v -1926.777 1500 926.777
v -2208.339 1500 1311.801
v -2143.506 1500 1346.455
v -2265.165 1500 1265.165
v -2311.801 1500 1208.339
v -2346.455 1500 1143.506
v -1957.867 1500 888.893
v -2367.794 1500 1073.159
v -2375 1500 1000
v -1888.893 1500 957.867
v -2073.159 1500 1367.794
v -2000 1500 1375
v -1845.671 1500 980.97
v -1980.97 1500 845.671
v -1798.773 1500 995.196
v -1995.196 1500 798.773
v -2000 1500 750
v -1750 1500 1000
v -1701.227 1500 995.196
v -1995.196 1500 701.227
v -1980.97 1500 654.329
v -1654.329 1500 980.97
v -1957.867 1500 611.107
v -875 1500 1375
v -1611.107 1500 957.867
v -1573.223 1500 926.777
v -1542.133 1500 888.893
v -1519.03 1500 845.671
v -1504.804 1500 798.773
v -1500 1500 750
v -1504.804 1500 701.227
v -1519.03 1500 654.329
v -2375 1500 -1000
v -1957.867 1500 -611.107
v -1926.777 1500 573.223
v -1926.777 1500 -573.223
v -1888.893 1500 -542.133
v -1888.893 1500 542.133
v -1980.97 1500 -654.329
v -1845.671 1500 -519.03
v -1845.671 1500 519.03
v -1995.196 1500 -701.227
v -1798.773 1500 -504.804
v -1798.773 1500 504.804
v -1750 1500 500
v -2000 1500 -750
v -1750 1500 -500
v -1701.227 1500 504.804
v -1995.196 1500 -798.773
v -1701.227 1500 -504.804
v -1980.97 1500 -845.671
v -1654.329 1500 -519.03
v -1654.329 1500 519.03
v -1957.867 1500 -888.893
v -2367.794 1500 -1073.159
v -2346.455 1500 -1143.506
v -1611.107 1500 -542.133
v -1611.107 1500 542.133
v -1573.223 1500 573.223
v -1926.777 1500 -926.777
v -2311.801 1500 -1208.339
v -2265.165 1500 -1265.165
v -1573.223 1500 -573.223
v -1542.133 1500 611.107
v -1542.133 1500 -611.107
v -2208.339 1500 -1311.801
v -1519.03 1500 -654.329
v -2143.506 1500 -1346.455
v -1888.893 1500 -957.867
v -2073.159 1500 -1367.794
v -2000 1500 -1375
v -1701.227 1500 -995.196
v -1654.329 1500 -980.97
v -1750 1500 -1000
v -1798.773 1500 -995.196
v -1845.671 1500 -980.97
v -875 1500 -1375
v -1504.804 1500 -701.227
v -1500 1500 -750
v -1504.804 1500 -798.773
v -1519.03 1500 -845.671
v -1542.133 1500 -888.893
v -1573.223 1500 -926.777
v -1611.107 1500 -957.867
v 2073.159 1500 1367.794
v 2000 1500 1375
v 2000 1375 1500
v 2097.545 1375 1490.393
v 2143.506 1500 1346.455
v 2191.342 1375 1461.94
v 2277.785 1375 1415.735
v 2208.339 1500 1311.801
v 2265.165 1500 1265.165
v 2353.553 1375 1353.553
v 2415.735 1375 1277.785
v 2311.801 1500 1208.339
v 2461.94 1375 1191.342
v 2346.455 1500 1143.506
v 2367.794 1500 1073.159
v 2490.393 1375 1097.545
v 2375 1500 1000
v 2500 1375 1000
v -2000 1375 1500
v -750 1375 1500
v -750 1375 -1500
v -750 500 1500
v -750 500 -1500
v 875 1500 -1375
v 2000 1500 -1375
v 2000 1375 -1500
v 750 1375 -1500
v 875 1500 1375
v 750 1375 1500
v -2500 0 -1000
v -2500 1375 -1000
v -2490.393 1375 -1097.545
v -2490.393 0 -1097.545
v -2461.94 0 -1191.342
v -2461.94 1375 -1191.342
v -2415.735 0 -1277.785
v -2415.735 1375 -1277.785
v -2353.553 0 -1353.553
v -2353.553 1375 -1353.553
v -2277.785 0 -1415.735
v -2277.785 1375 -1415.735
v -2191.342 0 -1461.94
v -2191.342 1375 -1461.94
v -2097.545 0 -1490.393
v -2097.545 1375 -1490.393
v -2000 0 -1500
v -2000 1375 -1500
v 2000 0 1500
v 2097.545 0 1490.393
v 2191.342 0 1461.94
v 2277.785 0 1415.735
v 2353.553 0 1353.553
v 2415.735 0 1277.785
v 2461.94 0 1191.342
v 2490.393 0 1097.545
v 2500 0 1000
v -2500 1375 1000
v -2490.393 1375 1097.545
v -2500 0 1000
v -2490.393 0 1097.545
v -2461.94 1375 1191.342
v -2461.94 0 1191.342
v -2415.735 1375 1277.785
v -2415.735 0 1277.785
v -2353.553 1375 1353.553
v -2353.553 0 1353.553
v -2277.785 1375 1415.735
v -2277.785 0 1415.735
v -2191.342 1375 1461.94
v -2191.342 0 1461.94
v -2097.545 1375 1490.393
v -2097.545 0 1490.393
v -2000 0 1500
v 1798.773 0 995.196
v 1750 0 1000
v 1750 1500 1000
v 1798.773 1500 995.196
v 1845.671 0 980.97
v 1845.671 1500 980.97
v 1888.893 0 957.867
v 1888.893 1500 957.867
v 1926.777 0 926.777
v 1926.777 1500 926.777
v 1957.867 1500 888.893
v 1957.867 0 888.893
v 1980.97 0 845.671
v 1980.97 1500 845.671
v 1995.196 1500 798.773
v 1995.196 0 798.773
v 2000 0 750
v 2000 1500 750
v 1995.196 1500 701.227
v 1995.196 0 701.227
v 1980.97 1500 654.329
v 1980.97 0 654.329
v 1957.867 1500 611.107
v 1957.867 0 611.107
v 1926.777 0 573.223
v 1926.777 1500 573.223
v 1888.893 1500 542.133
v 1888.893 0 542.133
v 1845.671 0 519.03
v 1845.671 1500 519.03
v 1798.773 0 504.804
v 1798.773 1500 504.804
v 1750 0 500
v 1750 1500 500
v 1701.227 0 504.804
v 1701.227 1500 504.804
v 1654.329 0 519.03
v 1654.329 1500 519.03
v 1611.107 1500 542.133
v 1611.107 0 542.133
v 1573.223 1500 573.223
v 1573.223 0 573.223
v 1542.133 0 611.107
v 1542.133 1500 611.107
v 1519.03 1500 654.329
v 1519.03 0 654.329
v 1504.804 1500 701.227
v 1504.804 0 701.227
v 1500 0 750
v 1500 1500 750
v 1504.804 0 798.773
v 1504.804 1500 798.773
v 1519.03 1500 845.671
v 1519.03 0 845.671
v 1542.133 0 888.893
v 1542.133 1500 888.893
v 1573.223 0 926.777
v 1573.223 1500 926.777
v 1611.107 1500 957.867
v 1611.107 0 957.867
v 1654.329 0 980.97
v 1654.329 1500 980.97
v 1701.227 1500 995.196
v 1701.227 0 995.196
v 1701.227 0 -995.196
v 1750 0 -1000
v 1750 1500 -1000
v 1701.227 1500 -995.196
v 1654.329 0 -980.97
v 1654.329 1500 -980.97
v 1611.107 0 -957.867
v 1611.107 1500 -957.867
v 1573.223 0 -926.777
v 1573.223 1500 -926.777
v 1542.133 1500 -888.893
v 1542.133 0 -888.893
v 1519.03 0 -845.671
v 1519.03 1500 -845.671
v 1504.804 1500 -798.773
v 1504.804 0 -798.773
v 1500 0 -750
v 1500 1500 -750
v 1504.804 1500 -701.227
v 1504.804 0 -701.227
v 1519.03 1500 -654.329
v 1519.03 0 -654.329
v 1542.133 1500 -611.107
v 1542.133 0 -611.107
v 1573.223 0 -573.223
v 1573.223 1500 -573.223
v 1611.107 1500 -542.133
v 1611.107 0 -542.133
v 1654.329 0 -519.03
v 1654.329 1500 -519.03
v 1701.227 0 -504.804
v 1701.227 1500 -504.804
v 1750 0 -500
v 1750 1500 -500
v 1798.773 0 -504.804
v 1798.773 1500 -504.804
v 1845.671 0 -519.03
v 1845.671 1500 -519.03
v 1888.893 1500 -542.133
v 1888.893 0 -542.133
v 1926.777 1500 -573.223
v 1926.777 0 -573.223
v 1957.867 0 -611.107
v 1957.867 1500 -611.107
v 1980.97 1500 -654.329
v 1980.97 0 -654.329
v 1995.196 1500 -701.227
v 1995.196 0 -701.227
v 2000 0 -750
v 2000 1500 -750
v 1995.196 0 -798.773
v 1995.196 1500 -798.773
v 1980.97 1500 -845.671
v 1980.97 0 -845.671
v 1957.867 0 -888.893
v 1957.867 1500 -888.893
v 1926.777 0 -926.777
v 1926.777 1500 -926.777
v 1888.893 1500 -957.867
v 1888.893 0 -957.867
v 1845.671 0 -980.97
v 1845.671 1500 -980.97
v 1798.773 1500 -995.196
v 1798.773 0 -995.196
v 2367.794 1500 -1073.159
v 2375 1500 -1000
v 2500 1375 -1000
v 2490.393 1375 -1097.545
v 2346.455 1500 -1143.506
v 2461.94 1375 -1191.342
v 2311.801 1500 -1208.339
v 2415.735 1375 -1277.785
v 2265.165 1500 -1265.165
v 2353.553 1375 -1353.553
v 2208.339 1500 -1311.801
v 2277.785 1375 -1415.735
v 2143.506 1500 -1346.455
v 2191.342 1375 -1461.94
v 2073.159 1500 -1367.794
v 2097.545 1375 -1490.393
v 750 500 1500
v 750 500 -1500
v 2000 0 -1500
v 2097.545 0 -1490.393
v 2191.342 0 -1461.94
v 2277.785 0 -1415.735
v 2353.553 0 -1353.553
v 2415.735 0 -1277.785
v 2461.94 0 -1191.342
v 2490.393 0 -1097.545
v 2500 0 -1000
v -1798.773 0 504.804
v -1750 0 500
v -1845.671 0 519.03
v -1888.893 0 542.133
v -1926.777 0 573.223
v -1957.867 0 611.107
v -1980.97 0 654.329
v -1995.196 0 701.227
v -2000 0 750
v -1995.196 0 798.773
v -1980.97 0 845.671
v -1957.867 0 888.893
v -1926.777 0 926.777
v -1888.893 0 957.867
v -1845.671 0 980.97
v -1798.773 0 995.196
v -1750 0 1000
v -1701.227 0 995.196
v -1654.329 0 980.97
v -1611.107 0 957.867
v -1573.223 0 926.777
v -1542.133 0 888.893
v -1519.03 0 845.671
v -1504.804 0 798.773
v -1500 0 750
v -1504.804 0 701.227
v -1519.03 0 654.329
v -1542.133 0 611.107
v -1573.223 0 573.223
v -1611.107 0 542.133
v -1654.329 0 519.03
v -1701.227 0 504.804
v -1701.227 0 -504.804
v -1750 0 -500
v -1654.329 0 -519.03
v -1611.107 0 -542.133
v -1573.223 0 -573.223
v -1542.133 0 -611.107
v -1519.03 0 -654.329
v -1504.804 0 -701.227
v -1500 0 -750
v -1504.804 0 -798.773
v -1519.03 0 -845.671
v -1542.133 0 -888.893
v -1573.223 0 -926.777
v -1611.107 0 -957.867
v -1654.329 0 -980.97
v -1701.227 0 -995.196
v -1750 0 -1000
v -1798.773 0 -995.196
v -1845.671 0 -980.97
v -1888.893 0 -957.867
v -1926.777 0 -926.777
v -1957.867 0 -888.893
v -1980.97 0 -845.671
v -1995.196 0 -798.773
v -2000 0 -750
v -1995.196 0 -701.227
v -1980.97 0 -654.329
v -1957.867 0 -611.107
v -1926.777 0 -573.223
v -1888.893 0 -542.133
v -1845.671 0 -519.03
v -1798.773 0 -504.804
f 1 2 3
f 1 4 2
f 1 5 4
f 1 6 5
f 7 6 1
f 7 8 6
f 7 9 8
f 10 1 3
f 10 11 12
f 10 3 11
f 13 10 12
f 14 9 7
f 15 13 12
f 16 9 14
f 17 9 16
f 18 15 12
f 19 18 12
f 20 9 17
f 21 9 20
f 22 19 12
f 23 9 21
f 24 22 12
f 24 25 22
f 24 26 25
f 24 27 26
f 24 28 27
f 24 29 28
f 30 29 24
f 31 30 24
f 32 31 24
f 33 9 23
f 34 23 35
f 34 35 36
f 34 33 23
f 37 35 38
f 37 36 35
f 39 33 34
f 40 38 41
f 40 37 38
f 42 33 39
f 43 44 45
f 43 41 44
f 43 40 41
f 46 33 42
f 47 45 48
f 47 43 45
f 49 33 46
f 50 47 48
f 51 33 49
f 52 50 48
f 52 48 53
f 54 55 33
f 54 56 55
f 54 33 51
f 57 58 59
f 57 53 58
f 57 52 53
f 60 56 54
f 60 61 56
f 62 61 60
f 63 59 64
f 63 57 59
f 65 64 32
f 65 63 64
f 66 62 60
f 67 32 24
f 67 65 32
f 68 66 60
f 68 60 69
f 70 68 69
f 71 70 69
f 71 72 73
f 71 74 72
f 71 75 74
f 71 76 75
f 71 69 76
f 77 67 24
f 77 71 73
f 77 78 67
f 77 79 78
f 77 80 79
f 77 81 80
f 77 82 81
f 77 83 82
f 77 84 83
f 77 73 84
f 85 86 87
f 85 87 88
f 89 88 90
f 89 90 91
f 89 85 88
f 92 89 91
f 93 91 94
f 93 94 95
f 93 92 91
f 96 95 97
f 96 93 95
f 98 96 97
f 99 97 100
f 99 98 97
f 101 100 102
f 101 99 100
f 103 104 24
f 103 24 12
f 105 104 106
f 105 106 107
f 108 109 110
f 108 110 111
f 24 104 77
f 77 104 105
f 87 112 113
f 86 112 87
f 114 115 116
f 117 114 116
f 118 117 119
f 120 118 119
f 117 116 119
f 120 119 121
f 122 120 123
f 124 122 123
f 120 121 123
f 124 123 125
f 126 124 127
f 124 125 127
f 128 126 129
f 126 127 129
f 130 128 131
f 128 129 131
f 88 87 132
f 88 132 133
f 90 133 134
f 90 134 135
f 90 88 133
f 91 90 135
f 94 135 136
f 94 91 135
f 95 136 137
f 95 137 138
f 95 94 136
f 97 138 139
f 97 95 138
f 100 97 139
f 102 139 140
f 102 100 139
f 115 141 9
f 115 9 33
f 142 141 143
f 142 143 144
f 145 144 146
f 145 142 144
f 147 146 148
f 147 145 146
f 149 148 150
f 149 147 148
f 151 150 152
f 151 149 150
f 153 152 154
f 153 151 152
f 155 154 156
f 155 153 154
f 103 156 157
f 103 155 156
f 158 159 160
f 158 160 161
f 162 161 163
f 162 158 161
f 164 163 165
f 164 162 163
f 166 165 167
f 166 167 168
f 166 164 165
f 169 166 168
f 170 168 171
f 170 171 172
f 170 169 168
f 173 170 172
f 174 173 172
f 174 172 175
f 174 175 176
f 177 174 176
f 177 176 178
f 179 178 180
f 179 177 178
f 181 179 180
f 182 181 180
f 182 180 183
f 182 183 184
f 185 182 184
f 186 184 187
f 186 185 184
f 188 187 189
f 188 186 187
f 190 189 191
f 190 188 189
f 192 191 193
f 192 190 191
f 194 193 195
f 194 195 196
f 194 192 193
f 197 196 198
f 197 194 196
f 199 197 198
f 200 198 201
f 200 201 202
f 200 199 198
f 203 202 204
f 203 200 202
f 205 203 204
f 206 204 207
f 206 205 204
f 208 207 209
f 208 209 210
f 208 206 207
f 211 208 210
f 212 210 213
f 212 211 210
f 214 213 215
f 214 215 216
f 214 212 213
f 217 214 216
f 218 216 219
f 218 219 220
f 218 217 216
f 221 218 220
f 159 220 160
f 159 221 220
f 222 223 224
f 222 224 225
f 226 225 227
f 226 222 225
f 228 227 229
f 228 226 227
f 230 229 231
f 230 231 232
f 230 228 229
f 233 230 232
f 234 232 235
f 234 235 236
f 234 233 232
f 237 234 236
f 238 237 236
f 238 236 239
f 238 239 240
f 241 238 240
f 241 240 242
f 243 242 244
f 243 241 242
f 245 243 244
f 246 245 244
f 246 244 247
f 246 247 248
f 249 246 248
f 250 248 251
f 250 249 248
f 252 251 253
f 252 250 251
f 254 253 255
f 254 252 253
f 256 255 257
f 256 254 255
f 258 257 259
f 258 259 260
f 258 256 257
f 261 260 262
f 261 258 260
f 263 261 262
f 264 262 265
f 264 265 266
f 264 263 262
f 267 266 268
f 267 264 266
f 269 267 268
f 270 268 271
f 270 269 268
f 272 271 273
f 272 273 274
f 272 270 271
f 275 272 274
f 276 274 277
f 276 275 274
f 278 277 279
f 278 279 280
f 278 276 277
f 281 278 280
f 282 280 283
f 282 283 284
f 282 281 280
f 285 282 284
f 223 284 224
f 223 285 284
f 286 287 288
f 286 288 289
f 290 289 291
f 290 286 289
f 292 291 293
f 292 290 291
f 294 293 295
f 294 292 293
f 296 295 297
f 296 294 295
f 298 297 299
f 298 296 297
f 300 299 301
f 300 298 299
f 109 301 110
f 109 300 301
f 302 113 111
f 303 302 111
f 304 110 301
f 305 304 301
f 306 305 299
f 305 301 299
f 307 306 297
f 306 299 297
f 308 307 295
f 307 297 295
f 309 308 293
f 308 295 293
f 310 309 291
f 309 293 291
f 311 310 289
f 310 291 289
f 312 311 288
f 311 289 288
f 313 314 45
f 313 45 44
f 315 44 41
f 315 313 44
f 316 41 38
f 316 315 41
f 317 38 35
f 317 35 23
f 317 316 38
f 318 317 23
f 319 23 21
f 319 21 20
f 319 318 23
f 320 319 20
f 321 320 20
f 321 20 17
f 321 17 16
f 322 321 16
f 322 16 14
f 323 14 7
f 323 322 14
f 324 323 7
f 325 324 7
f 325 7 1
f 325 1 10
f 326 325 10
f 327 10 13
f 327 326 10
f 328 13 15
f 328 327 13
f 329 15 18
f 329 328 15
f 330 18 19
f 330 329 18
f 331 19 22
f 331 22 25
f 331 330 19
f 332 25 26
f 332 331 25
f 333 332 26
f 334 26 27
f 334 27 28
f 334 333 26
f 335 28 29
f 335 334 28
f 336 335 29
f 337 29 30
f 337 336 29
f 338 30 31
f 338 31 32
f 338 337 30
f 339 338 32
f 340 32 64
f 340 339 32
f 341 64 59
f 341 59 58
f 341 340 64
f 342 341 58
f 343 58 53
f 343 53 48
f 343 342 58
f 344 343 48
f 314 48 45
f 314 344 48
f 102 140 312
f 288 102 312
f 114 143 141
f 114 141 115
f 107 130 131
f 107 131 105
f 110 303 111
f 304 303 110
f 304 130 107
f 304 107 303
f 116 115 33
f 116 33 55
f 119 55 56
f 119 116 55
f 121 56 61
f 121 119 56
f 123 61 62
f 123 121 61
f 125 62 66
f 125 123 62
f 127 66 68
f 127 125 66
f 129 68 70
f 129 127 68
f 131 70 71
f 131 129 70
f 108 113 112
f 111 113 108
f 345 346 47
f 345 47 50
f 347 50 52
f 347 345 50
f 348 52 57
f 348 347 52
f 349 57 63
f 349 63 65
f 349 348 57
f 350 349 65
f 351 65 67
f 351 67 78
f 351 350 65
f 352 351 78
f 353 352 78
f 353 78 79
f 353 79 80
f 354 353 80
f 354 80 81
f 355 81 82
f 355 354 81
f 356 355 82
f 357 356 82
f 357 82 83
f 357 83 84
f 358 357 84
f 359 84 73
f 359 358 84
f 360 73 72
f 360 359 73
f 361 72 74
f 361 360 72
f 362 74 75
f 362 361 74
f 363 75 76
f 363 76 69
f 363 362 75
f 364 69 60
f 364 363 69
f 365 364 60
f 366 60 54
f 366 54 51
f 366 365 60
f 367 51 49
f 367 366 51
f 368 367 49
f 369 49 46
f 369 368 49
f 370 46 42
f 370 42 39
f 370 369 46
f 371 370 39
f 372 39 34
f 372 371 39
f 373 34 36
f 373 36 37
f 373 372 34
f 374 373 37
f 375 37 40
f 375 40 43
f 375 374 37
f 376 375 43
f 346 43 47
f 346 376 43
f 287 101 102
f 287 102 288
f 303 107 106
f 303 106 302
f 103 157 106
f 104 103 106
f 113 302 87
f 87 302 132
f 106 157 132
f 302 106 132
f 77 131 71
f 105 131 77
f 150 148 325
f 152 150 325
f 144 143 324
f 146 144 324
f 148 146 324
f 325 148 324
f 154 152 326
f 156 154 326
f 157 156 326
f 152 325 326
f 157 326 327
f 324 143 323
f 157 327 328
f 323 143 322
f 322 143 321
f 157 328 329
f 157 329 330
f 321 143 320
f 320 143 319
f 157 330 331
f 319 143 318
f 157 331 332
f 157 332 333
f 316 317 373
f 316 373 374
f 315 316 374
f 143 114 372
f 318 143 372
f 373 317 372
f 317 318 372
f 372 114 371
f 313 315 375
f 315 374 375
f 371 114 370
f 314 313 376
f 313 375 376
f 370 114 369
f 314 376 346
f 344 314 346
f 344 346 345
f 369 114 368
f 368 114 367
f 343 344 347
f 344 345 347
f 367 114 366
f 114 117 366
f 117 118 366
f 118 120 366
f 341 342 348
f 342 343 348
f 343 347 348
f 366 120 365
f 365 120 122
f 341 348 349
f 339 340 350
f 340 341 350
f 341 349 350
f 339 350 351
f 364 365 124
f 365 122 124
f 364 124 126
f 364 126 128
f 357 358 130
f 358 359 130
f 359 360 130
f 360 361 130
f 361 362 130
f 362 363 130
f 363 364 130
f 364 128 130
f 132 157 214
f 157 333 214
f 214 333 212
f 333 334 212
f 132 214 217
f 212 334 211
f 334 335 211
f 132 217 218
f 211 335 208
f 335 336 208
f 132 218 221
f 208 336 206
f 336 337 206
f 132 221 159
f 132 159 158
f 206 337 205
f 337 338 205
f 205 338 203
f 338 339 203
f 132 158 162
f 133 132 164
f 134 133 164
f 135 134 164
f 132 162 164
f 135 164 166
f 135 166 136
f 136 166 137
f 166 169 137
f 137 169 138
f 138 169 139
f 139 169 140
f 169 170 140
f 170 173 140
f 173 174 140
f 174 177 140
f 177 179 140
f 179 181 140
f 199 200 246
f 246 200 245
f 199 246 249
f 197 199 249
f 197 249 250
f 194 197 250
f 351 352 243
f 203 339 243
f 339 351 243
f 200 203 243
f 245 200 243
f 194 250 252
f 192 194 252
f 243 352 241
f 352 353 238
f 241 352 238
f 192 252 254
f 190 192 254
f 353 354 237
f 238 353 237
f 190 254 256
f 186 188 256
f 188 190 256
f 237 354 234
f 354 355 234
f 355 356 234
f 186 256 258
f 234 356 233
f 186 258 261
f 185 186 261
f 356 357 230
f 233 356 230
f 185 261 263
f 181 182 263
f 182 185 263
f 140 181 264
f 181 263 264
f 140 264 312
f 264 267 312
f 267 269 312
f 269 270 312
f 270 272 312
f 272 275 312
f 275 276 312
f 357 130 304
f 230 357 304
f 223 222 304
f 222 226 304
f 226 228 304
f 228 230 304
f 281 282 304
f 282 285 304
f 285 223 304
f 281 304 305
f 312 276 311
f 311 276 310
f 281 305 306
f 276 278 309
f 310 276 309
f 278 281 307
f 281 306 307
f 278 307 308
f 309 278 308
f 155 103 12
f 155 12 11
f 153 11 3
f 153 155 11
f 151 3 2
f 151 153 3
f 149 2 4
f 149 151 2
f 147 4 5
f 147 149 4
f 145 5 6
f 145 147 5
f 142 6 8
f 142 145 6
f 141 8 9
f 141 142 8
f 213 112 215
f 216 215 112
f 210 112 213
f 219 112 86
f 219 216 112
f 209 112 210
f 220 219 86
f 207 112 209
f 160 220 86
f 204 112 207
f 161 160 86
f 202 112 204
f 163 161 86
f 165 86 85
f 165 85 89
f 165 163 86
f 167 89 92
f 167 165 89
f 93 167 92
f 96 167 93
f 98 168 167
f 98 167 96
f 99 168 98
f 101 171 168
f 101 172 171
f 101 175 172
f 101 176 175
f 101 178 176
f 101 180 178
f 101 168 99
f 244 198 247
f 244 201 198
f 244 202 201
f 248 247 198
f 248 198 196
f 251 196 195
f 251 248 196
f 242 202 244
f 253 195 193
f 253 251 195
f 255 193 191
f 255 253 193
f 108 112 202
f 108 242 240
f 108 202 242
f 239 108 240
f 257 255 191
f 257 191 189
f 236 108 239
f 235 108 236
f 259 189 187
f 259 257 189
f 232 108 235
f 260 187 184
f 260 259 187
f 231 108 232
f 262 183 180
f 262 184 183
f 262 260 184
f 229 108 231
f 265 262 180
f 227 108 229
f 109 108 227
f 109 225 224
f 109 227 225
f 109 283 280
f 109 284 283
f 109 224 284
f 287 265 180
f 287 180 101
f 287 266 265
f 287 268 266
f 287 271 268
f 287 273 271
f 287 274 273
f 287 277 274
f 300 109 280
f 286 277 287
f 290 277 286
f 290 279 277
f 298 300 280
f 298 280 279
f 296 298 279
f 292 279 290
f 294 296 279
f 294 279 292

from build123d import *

# Parameters (mm, degrees)
SKETCH1_W           = 5000
SKETCH1_H           = 3000
SKETCH1_R           = 250
BOSS_EXTRUDE1_DEPTH = 1500
SKETCH2_W           = 1500
SKETCH2_H           = 3000
CUT_EXTRUDE1_DEPTH  = 1000
FILLET1_R           = 500
CHAMFER1_SIZE       = 125


with BuildPart() as part:
    # Sketch1 → Boss-Extrude1 (new body)
    with BuildSketch(Plane(origin=(0, 0, 0), x_dir=(1, 0, 0), z_dir=(0, 1, 0))):
        Rectangle(SKETCH1_W, SKETCH1_H)
        with Locations(Location((-1750, 750, 0), (0, 0, 270))):
            Circle(SKETCH1_R, mode=Mode.SUBTRACT)
        with Locations(Location((1750, 750, 0), (0, 0, 90))):
            Circle(SKETCH1_R, mode=Mode.SUBTRACT)
        with Locations(Location((1750, -750, 0), (0, 0, 270))):
            Circle(SKETCH1_R, mode=Mode.SUBTRACT)
        with Locations(Location((-1750, -750, 0), (0, 0, 90))):
            Circle(SKETCH1_R, mode=Mode.SUBTRACT)
    extrude(amount=BOSS_EXTRUDE1_DEPTH)

    # Sketch2 → Cut-Extrude1 (cut)
    with BuildSketch(Plane(origin=(0, 1500, 0), x_dir=(1, 0, 0), z_dir=(0, 1, 0))):
        Rectangle(SKETCH2_W, SKETCH2_H)
    extrude(amount=-CUT_EXTRUDE1_DEPTH, mode=Mode.SUBTRACT)

    # Fillet1
    fillet1_edges = [part.edges().sort_by_distance(p)[0] for p in [
        (2500, 750, 1500),
        (-2500, 750, 1500),
        (-2500, 750, -1500),
        (2500, 750, -1500),
    ]]
    fillet(fillet1_edges, radius=FILLET1_R)

    # Chamfer1
    chamfer1_edges = [part.edges().sort_by_distance(p)[0] for p in [
        (1375, 1500, 1500),
        (-1375, 1500, -1500),
        (-750, 1500, 0),
        (750, 1500, 0),
        (-2500, 1500, 0),
        (1375, 1500, -1500),
        (-1375, 1500, 1500),
        (-2353.553390593, 1500, 1353.553390593),
        (-2353.553390593, 1500, -1353.553390593),
        (2500, 1500, 0),
        (2353.553390593, 1500, 1353.553390593),
        (2353.553390593, 1500, -1353.553390593),
    ]]
    chamfer(chamfer1_edges, length=CHAMFER1_SIZE)


solid = part.part
